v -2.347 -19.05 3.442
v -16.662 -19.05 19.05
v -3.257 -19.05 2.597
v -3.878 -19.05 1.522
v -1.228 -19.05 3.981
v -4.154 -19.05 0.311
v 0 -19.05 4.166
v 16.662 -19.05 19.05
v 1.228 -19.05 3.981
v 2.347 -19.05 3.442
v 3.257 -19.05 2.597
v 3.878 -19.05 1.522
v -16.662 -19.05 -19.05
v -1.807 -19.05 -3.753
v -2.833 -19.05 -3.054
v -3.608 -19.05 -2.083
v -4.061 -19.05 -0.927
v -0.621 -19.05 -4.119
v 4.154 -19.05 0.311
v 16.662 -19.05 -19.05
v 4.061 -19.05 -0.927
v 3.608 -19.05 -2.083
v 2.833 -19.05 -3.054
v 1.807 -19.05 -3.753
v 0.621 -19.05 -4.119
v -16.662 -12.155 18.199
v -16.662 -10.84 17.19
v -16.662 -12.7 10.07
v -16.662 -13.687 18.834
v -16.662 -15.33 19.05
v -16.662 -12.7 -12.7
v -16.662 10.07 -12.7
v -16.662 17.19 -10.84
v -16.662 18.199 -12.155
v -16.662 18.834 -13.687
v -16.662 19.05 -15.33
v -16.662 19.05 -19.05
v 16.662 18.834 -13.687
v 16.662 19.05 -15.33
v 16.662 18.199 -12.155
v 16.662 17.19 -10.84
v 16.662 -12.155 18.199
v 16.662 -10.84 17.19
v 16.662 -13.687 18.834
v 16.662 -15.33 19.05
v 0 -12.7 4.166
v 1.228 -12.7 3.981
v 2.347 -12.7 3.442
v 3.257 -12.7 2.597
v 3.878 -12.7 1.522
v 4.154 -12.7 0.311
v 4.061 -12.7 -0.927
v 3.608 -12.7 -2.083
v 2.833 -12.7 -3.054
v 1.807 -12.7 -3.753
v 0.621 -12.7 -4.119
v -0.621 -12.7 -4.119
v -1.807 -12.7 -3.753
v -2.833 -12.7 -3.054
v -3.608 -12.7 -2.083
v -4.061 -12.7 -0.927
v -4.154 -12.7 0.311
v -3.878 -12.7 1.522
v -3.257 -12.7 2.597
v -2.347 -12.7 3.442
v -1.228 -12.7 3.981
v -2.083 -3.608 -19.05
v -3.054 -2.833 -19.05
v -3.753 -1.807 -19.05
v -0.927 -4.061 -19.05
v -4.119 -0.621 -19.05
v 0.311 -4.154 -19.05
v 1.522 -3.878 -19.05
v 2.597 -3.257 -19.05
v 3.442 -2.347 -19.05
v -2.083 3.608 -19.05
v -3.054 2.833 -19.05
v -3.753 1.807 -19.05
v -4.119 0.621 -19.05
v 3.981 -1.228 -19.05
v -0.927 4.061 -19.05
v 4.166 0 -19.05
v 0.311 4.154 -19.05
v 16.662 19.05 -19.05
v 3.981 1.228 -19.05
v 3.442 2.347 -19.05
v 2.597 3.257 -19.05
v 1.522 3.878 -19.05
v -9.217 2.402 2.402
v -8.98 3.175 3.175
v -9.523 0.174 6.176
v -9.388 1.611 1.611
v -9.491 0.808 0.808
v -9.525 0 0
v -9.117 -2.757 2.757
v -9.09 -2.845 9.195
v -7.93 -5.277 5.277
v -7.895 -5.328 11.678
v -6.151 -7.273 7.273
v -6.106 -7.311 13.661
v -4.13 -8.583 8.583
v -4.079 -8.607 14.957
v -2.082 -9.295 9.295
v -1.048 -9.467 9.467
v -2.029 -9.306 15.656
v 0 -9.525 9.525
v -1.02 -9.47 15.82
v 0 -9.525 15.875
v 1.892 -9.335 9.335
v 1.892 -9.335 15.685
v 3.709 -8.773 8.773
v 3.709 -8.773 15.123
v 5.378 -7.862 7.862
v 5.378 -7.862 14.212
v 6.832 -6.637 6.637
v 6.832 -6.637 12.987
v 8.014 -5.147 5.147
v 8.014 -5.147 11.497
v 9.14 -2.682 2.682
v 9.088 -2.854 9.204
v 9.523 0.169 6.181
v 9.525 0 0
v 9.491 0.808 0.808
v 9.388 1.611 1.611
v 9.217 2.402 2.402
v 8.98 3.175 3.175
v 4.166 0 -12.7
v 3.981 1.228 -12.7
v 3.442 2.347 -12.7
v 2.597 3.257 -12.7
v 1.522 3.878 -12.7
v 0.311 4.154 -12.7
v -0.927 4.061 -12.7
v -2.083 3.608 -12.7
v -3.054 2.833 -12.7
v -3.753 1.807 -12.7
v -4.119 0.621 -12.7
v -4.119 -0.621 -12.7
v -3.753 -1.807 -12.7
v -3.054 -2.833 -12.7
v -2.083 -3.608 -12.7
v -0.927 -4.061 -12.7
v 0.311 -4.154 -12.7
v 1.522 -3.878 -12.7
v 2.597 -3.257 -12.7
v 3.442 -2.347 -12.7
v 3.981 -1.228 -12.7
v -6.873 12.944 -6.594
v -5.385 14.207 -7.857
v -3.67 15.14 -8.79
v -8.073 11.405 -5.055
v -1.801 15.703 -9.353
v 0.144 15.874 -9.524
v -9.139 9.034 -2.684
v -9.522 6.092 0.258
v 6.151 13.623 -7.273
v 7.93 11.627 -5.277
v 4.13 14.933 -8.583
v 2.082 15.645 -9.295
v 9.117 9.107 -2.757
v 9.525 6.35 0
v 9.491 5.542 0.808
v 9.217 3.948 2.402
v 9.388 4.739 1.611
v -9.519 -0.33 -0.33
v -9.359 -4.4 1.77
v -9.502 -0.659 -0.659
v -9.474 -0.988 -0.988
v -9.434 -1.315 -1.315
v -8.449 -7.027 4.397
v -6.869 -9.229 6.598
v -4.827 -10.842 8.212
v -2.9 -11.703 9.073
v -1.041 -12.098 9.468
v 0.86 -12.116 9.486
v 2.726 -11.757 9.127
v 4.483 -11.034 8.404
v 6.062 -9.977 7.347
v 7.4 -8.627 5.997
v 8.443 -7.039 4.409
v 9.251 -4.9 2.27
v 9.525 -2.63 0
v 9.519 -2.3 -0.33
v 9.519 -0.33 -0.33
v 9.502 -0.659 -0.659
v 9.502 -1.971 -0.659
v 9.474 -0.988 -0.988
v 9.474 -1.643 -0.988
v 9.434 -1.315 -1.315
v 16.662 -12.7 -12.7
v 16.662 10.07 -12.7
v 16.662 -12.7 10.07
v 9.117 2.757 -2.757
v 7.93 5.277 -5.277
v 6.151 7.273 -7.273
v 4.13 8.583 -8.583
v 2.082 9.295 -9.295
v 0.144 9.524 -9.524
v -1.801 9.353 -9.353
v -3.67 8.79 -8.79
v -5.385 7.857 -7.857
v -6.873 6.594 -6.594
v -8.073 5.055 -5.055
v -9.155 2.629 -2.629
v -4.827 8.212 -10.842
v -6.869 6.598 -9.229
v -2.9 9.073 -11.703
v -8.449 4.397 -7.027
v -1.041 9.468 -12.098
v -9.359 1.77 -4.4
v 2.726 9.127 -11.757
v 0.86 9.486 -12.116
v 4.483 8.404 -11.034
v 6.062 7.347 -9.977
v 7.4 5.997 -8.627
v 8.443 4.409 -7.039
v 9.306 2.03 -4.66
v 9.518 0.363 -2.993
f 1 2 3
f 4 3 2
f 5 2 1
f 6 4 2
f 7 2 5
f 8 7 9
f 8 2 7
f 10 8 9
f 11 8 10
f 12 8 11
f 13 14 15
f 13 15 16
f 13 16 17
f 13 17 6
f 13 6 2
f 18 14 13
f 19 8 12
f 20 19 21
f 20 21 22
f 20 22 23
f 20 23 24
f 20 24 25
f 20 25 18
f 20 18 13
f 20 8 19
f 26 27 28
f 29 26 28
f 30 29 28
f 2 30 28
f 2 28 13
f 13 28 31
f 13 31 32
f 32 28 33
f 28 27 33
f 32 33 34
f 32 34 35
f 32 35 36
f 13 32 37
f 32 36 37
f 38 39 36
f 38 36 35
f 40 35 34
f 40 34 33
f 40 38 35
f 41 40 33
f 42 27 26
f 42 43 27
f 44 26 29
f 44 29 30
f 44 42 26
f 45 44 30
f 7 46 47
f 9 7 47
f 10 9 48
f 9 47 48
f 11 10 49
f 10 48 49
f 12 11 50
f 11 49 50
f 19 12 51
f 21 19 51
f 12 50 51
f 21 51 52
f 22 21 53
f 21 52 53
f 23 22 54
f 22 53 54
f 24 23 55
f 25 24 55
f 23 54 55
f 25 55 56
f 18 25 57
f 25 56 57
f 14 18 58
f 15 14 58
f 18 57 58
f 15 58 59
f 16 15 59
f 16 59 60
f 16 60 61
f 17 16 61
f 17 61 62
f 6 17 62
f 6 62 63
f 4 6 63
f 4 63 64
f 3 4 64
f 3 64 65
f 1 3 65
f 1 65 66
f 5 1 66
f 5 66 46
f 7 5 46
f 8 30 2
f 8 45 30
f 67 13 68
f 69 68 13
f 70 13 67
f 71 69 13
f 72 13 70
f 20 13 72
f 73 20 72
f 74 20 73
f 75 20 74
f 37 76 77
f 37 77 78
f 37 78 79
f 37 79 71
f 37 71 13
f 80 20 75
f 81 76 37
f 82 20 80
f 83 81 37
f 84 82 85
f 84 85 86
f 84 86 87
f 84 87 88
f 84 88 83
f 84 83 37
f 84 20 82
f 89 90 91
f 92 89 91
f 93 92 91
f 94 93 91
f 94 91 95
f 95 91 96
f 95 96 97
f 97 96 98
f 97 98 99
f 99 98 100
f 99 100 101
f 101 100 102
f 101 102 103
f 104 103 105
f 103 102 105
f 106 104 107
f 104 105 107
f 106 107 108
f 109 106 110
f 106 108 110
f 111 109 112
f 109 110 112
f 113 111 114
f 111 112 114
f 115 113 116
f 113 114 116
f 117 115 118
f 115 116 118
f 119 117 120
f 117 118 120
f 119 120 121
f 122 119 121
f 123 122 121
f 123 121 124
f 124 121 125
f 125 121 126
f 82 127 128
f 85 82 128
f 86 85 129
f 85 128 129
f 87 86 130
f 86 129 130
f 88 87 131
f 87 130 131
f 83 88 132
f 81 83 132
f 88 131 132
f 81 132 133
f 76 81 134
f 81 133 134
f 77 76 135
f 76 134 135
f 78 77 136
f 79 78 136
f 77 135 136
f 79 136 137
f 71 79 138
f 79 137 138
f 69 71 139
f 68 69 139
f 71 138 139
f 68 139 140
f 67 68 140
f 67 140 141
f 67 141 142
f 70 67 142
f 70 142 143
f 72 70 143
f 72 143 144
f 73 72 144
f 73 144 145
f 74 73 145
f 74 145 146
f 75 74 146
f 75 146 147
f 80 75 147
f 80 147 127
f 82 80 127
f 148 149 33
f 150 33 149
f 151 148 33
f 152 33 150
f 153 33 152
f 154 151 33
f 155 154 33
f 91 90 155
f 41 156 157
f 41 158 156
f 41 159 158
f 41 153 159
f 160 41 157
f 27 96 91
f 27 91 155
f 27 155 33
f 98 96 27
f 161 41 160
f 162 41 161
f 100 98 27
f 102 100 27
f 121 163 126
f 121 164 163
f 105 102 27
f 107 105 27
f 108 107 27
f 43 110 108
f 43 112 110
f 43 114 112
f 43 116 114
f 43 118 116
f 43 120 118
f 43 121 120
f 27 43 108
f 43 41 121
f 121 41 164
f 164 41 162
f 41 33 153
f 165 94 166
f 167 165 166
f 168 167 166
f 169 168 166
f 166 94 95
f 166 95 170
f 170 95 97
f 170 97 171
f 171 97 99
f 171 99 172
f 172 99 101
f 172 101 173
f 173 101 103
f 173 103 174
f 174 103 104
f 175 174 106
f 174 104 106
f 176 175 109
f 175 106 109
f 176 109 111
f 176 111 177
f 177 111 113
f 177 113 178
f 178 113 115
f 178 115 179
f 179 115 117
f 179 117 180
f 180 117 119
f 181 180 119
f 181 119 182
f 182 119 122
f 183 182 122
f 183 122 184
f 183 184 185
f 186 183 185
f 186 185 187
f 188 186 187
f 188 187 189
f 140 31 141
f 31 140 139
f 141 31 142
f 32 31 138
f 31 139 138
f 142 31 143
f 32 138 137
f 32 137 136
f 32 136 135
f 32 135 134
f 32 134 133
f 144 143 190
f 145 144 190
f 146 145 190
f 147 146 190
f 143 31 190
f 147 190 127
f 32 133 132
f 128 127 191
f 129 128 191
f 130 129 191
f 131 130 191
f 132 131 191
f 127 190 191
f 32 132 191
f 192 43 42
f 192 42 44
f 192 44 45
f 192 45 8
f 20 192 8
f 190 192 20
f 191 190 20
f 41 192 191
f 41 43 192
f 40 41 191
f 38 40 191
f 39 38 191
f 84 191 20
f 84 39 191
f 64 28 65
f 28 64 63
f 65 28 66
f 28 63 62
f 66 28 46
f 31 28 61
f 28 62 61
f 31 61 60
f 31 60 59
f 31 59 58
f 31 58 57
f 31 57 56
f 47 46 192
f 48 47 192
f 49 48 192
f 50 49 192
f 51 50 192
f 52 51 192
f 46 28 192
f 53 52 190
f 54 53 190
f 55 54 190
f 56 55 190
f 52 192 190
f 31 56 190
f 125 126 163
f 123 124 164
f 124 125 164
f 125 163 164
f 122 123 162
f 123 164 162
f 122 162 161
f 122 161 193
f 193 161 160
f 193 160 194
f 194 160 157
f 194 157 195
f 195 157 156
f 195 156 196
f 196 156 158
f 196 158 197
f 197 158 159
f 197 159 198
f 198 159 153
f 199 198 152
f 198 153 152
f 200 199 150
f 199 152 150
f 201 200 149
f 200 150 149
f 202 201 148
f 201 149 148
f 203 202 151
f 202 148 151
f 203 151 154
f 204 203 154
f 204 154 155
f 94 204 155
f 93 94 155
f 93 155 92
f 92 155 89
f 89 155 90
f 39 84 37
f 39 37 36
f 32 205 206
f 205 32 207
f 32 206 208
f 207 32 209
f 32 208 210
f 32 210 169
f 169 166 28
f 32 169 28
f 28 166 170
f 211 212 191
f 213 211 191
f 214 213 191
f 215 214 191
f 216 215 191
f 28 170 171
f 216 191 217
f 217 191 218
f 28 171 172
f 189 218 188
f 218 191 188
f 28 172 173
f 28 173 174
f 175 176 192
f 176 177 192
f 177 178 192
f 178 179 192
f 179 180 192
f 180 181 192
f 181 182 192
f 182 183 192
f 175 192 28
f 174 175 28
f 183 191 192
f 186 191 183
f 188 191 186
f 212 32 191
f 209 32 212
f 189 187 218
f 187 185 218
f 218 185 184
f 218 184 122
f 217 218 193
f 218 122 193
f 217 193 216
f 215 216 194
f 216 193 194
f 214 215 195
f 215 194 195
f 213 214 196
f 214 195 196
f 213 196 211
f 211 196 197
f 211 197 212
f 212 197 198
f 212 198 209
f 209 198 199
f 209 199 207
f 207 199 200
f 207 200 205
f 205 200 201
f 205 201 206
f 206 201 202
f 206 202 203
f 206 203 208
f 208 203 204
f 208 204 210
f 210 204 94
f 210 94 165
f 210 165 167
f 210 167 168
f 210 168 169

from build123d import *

# Parameters (mm, degrees)
BOSS_EXTRUDE1_DEPTH = 16.6624
CUT_EXTRUDE1_REACH  = 42.603
SKETCH5_R           = 4.1656
CUT_EXTRUDE2_REACH  = 42.603
SKETCH6_R           = 4.1656
CUT_EXTRUDE9_REACH  = 47.74
SKETCH27_R          = 9.525
CUT_EXTRUDE10_REACH = 47.74
SKETCH28_R          = 9.525


with BuildPart() as part:
    # Sketch4 → Boss-Extrude1 (new, symmetric)
    with BuildSketch(Plane(origin=(0, 0, 0), x_dir=(0, 0, -1), z_dir=(1, 0, 0))):
        with BuildLine():
            Line((-19.05, -19.05), (19.05, -19.05))
            Line((19.05, -19.05), (19.05, 19.05))
            Line((19.05, 19.05), (15.330256, 19.05))
            ThreePointArc((15.330256, 19.05), (12.900216, 18.566635), (10.840128, 17.190128))
            Line((10.840128, 17.190128), (-17.190128, -10.840128))
            ThreePointArc((-17.190128, -10.840128), (-18.566635, -12.900216), (-19.05, -15.330256))
            Line((-19.05, -15.330256), (-19.05, -19.05))
        make_face()
        Polygon((-10.069744, -12.7), (12.7, -12.7), (12.7, 10.069744), align=None, mode=Mode.SUBTRACT)
    extrude(amount=BOSS_EXTRUDE1_DEPTH, both=True)

    # Sketch5 → Cut-Extrude1 (cut, up to next)
    with BuildSketch(Plane(origin=(0, -12.7, 0), x_dir=(1, 0, 0), z_dir=(0, 1, 0)), mode=Mode.PRIVATE) as cut_extrude1_sk1:
        with Locations(Location((0, 0, 0), (0, 0, 270))):
            Circle(SKETCH5_R)
    cut_extrude1_tool1 = extrude(cut_extrude1_sk1.sketch, amount=-CUT_EXTRUDE1_REACH, mode=Mode.PRIVATE) & part.part
    add(cut_extrude1_tool1.solids().sort_by_distance((0, -12.7, 0))[0], mode=Mode.SUBTRACT)

    # Sketch6 → Cut-Extrude2 (cut, up to next)
    with BuildSketch(Plane.XY.offset(-12.7), mode=Mode.PRIVATE) as cut_extrude2_sk1:
        Circle(SKETCH6_R)
    cut_extrude2_tool1 = extrude(cut_extrude2_sk1.sketch, amount=-CUT_EXTRUDE2_REACH, mode=Mode.PRIVATE) & part.part
    add(cut_extrude2_tool1.solids().sort_by_distance((0, 0, -12.7))[0], mode=Mode.SUBTRACT)

    # Cut-Extrude9: up to this plane
    cut_extrude9_end = Plane(origin=(16.6624, -12.7, 10.069744), z_dir=(0, -0.7071067811865474, -0.7071067811865477))
    # Sketch27 → Cut-Extrude9 (cut, up to the surface)
    with BuildSketch(Plane.XY.offset(19.05), mode=Mode.PRIVATE) as cut_extrude9_sk1:
        with Locations(Location((0, 0, 0), (0, 0, 270))):
            Circle(SKETCH27_R)
    cut_extrude9_tool1 = split(extrude(cut_extrude9_sk1.sketch, amount=-CUT_EXTRUDE9_REACH, mode=Mode.PRIVATE), bisect_by=cut_extrude9_end, keep=Keep.BOTH, mode=Mode.PRIVATE)
    add(cut_extrude9_tool1.solids().sort_by_distance((0, 0, 19.05))[0], mode=Mode.SUBTRACT)

    # Cut-Extrude10: up to this face of the body (flat: up to its plane)
    cut_extrude10_end = Plane(part.part.faces().sort_by_distance((-16.258791, -12.7, -1.315128))[0])
    # Sketch28 → Cut-Extrude10 (cut, up to the picked face)
    with BuildSketch(Plane(origin=(0, 19.05, 0), x_dir=(1, 0, 0), z_dir=(0, 1, 0)), mode=Mode.PRIVATE) as cut_extrude10_sk1:
        Circle(SKETCH28_R)
    cut_extrude10_tool1 = split(extrude(cut_extrude10_sk1.sketch, amount=-CUT_EXTRUDE10_REACH, mode=Mode.PRIVATE), bisect_by=cut_extrude10_end, keep=Keep.BOTH, mode=Mode.PRIVATE)
    add(cut_extrude10_tool1.solids().sort_by(Axis((0, 19.05, 0), (0, -1, 0)))[0], mode=Mode.SUBTRACT)


solid = part.part
